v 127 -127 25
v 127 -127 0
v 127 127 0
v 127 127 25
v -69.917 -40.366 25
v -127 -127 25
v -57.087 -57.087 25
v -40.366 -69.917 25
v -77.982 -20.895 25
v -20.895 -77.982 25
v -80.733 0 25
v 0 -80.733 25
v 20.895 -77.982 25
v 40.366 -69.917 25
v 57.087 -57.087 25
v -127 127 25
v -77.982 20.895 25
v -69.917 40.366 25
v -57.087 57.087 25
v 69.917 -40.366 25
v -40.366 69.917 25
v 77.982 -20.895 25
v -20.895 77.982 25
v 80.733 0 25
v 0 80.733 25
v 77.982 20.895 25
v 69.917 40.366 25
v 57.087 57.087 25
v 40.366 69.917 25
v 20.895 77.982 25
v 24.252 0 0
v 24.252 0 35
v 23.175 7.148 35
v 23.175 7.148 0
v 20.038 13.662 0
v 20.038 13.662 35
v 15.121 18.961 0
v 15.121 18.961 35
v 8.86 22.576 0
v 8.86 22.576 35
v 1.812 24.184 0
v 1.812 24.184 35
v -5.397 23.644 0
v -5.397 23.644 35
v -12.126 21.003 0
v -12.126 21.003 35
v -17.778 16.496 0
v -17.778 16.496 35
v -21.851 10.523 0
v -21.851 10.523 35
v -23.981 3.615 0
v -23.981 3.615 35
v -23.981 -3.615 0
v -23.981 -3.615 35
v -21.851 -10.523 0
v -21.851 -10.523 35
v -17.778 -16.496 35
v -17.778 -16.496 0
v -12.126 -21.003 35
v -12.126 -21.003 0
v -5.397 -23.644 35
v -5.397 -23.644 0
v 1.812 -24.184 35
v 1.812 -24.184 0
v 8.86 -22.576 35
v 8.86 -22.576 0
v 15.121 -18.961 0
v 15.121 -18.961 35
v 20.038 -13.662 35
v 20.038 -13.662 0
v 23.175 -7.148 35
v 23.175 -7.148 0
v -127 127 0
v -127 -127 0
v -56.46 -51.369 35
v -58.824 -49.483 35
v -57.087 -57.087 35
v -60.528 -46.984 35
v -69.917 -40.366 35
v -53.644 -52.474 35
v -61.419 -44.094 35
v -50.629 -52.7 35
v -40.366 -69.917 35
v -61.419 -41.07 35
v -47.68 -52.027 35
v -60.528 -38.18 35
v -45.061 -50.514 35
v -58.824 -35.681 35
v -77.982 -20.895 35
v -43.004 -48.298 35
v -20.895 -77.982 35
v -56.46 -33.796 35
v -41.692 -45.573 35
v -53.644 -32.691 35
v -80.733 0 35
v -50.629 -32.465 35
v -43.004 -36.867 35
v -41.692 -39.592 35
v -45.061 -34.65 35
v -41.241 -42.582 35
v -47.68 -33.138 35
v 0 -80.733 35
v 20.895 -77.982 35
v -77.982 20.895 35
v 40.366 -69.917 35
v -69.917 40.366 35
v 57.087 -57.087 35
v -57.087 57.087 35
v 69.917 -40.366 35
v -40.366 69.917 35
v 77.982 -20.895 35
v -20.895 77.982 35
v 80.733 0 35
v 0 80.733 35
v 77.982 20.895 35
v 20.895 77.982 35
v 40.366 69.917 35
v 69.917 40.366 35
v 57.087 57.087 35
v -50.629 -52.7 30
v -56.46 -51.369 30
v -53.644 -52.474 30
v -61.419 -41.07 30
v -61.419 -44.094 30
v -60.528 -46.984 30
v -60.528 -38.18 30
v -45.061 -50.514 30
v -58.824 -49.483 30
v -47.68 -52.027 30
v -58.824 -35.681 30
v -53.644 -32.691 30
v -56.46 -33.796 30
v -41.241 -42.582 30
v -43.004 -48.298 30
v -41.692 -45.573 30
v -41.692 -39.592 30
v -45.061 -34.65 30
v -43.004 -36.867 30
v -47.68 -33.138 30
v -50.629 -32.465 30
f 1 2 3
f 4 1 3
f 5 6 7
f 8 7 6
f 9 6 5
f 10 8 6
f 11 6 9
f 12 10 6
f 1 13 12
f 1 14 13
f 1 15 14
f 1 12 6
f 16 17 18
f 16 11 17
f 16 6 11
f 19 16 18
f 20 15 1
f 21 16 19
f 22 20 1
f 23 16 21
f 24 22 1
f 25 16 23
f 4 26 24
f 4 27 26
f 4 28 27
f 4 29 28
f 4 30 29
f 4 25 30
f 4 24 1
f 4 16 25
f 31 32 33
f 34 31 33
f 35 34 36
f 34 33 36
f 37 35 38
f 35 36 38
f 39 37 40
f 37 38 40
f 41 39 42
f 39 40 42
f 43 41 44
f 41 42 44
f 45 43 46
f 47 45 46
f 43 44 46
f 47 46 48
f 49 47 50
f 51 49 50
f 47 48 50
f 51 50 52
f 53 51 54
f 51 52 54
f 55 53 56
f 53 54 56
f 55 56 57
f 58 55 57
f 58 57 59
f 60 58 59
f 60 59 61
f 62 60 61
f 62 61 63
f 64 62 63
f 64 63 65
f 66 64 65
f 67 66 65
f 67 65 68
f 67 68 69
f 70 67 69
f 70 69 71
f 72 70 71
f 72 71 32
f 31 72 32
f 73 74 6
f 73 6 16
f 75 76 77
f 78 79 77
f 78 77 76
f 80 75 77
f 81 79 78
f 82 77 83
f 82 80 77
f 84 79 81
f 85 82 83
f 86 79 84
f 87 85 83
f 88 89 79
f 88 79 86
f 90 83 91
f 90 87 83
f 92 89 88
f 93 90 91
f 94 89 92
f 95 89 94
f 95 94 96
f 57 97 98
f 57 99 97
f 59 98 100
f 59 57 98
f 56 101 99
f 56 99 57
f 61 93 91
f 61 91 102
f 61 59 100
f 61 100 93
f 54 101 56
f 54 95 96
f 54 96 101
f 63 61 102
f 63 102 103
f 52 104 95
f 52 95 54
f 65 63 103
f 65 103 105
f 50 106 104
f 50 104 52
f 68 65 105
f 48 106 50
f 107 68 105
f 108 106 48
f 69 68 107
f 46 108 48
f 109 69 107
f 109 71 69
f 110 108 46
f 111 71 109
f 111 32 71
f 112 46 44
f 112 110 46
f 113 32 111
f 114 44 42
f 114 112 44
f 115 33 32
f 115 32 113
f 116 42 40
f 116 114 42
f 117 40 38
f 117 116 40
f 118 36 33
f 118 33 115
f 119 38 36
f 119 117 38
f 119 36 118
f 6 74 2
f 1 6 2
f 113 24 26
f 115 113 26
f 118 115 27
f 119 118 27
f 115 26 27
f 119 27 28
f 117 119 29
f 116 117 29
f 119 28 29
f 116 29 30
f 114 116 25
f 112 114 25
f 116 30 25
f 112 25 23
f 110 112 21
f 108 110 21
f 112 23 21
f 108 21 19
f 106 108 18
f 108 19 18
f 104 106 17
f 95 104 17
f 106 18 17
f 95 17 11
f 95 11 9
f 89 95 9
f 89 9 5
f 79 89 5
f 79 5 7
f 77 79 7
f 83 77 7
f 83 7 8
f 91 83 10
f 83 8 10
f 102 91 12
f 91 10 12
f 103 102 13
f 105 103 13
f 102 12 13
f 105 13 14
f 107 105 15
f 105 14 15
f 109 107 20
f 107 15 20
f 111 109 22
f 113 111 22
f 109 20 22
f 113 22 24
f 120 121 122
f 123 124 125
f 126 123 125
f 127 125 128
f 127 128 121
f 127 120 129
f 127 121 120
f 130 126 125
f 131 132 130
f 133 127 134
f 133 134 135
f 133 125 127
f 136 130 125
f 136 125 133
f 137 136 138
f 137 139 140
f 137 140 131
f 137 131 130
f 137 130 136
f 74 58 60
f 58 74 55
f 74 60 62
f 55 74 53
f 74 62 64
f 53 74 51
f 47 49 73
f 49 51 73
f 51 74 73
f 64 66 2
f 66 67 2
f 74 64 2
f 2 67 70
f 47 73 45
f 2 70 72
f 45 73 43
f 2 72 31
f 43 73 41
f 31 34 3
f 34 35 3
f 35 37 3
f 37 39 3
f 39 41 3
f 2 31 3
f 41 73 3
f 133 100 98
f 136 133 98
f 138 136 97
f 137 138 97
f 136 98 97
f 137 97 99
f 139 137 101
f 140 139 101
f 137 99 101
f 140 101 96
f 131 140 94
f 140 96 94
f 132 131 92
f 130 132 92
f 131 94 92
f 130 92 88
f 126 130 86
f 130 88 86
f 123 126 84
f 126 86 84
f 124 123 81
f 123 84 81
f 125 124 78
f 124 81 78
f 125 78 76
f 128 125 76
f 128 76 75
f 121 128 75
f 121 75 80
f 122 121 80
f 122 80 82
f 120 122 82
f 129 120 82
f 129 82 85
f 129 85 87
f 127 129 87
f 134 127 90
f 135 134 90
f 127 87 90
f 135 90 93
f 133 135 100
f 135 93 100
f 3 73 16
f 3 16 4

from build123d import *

# Parameters (mm, degrees)
F0_W     = 254
F0_H     = 254
F1_DEPTH = 25
F2_R     = 80.732705
F3_DEPTH = 10
F4_R     = 24.252293
F5_DEPTH = 1270
F6_R     = 10.145806
F7_DEPTH = 5


with BuildPart() as f1:
    # F0 (on Top) → F1 (new body)
    with BuildSketch(Plane.XY):
        Rectangle(F0_W, F0_H)
    extrude(amount=F1_DEPTH)

    # F2 (on face) → F3 (join)
    with BuildSketch(Plane.XY.offset(25)):
        Circle(F2_R)
    extrude(amount=F3_DEPTH)

    # F4 (on face) → F5 (cut)
    with BuildSketch(Plane.XY.offset(35)):
        Circle(F4_R)
    extrude(amount=-F5_DEPTH, mode=Mode.SUBTRACT)

    # F6 (on face) → F7 (cut)
    with BuildSketch(Plane.XY.offset(35)):
        with Locations((-51.386729, -42.582173)):
            Circle(F6_R)
    extrude(amount=-F7_DEPTH, mode=Mode.SUBTRACT)


solid = f1.part
